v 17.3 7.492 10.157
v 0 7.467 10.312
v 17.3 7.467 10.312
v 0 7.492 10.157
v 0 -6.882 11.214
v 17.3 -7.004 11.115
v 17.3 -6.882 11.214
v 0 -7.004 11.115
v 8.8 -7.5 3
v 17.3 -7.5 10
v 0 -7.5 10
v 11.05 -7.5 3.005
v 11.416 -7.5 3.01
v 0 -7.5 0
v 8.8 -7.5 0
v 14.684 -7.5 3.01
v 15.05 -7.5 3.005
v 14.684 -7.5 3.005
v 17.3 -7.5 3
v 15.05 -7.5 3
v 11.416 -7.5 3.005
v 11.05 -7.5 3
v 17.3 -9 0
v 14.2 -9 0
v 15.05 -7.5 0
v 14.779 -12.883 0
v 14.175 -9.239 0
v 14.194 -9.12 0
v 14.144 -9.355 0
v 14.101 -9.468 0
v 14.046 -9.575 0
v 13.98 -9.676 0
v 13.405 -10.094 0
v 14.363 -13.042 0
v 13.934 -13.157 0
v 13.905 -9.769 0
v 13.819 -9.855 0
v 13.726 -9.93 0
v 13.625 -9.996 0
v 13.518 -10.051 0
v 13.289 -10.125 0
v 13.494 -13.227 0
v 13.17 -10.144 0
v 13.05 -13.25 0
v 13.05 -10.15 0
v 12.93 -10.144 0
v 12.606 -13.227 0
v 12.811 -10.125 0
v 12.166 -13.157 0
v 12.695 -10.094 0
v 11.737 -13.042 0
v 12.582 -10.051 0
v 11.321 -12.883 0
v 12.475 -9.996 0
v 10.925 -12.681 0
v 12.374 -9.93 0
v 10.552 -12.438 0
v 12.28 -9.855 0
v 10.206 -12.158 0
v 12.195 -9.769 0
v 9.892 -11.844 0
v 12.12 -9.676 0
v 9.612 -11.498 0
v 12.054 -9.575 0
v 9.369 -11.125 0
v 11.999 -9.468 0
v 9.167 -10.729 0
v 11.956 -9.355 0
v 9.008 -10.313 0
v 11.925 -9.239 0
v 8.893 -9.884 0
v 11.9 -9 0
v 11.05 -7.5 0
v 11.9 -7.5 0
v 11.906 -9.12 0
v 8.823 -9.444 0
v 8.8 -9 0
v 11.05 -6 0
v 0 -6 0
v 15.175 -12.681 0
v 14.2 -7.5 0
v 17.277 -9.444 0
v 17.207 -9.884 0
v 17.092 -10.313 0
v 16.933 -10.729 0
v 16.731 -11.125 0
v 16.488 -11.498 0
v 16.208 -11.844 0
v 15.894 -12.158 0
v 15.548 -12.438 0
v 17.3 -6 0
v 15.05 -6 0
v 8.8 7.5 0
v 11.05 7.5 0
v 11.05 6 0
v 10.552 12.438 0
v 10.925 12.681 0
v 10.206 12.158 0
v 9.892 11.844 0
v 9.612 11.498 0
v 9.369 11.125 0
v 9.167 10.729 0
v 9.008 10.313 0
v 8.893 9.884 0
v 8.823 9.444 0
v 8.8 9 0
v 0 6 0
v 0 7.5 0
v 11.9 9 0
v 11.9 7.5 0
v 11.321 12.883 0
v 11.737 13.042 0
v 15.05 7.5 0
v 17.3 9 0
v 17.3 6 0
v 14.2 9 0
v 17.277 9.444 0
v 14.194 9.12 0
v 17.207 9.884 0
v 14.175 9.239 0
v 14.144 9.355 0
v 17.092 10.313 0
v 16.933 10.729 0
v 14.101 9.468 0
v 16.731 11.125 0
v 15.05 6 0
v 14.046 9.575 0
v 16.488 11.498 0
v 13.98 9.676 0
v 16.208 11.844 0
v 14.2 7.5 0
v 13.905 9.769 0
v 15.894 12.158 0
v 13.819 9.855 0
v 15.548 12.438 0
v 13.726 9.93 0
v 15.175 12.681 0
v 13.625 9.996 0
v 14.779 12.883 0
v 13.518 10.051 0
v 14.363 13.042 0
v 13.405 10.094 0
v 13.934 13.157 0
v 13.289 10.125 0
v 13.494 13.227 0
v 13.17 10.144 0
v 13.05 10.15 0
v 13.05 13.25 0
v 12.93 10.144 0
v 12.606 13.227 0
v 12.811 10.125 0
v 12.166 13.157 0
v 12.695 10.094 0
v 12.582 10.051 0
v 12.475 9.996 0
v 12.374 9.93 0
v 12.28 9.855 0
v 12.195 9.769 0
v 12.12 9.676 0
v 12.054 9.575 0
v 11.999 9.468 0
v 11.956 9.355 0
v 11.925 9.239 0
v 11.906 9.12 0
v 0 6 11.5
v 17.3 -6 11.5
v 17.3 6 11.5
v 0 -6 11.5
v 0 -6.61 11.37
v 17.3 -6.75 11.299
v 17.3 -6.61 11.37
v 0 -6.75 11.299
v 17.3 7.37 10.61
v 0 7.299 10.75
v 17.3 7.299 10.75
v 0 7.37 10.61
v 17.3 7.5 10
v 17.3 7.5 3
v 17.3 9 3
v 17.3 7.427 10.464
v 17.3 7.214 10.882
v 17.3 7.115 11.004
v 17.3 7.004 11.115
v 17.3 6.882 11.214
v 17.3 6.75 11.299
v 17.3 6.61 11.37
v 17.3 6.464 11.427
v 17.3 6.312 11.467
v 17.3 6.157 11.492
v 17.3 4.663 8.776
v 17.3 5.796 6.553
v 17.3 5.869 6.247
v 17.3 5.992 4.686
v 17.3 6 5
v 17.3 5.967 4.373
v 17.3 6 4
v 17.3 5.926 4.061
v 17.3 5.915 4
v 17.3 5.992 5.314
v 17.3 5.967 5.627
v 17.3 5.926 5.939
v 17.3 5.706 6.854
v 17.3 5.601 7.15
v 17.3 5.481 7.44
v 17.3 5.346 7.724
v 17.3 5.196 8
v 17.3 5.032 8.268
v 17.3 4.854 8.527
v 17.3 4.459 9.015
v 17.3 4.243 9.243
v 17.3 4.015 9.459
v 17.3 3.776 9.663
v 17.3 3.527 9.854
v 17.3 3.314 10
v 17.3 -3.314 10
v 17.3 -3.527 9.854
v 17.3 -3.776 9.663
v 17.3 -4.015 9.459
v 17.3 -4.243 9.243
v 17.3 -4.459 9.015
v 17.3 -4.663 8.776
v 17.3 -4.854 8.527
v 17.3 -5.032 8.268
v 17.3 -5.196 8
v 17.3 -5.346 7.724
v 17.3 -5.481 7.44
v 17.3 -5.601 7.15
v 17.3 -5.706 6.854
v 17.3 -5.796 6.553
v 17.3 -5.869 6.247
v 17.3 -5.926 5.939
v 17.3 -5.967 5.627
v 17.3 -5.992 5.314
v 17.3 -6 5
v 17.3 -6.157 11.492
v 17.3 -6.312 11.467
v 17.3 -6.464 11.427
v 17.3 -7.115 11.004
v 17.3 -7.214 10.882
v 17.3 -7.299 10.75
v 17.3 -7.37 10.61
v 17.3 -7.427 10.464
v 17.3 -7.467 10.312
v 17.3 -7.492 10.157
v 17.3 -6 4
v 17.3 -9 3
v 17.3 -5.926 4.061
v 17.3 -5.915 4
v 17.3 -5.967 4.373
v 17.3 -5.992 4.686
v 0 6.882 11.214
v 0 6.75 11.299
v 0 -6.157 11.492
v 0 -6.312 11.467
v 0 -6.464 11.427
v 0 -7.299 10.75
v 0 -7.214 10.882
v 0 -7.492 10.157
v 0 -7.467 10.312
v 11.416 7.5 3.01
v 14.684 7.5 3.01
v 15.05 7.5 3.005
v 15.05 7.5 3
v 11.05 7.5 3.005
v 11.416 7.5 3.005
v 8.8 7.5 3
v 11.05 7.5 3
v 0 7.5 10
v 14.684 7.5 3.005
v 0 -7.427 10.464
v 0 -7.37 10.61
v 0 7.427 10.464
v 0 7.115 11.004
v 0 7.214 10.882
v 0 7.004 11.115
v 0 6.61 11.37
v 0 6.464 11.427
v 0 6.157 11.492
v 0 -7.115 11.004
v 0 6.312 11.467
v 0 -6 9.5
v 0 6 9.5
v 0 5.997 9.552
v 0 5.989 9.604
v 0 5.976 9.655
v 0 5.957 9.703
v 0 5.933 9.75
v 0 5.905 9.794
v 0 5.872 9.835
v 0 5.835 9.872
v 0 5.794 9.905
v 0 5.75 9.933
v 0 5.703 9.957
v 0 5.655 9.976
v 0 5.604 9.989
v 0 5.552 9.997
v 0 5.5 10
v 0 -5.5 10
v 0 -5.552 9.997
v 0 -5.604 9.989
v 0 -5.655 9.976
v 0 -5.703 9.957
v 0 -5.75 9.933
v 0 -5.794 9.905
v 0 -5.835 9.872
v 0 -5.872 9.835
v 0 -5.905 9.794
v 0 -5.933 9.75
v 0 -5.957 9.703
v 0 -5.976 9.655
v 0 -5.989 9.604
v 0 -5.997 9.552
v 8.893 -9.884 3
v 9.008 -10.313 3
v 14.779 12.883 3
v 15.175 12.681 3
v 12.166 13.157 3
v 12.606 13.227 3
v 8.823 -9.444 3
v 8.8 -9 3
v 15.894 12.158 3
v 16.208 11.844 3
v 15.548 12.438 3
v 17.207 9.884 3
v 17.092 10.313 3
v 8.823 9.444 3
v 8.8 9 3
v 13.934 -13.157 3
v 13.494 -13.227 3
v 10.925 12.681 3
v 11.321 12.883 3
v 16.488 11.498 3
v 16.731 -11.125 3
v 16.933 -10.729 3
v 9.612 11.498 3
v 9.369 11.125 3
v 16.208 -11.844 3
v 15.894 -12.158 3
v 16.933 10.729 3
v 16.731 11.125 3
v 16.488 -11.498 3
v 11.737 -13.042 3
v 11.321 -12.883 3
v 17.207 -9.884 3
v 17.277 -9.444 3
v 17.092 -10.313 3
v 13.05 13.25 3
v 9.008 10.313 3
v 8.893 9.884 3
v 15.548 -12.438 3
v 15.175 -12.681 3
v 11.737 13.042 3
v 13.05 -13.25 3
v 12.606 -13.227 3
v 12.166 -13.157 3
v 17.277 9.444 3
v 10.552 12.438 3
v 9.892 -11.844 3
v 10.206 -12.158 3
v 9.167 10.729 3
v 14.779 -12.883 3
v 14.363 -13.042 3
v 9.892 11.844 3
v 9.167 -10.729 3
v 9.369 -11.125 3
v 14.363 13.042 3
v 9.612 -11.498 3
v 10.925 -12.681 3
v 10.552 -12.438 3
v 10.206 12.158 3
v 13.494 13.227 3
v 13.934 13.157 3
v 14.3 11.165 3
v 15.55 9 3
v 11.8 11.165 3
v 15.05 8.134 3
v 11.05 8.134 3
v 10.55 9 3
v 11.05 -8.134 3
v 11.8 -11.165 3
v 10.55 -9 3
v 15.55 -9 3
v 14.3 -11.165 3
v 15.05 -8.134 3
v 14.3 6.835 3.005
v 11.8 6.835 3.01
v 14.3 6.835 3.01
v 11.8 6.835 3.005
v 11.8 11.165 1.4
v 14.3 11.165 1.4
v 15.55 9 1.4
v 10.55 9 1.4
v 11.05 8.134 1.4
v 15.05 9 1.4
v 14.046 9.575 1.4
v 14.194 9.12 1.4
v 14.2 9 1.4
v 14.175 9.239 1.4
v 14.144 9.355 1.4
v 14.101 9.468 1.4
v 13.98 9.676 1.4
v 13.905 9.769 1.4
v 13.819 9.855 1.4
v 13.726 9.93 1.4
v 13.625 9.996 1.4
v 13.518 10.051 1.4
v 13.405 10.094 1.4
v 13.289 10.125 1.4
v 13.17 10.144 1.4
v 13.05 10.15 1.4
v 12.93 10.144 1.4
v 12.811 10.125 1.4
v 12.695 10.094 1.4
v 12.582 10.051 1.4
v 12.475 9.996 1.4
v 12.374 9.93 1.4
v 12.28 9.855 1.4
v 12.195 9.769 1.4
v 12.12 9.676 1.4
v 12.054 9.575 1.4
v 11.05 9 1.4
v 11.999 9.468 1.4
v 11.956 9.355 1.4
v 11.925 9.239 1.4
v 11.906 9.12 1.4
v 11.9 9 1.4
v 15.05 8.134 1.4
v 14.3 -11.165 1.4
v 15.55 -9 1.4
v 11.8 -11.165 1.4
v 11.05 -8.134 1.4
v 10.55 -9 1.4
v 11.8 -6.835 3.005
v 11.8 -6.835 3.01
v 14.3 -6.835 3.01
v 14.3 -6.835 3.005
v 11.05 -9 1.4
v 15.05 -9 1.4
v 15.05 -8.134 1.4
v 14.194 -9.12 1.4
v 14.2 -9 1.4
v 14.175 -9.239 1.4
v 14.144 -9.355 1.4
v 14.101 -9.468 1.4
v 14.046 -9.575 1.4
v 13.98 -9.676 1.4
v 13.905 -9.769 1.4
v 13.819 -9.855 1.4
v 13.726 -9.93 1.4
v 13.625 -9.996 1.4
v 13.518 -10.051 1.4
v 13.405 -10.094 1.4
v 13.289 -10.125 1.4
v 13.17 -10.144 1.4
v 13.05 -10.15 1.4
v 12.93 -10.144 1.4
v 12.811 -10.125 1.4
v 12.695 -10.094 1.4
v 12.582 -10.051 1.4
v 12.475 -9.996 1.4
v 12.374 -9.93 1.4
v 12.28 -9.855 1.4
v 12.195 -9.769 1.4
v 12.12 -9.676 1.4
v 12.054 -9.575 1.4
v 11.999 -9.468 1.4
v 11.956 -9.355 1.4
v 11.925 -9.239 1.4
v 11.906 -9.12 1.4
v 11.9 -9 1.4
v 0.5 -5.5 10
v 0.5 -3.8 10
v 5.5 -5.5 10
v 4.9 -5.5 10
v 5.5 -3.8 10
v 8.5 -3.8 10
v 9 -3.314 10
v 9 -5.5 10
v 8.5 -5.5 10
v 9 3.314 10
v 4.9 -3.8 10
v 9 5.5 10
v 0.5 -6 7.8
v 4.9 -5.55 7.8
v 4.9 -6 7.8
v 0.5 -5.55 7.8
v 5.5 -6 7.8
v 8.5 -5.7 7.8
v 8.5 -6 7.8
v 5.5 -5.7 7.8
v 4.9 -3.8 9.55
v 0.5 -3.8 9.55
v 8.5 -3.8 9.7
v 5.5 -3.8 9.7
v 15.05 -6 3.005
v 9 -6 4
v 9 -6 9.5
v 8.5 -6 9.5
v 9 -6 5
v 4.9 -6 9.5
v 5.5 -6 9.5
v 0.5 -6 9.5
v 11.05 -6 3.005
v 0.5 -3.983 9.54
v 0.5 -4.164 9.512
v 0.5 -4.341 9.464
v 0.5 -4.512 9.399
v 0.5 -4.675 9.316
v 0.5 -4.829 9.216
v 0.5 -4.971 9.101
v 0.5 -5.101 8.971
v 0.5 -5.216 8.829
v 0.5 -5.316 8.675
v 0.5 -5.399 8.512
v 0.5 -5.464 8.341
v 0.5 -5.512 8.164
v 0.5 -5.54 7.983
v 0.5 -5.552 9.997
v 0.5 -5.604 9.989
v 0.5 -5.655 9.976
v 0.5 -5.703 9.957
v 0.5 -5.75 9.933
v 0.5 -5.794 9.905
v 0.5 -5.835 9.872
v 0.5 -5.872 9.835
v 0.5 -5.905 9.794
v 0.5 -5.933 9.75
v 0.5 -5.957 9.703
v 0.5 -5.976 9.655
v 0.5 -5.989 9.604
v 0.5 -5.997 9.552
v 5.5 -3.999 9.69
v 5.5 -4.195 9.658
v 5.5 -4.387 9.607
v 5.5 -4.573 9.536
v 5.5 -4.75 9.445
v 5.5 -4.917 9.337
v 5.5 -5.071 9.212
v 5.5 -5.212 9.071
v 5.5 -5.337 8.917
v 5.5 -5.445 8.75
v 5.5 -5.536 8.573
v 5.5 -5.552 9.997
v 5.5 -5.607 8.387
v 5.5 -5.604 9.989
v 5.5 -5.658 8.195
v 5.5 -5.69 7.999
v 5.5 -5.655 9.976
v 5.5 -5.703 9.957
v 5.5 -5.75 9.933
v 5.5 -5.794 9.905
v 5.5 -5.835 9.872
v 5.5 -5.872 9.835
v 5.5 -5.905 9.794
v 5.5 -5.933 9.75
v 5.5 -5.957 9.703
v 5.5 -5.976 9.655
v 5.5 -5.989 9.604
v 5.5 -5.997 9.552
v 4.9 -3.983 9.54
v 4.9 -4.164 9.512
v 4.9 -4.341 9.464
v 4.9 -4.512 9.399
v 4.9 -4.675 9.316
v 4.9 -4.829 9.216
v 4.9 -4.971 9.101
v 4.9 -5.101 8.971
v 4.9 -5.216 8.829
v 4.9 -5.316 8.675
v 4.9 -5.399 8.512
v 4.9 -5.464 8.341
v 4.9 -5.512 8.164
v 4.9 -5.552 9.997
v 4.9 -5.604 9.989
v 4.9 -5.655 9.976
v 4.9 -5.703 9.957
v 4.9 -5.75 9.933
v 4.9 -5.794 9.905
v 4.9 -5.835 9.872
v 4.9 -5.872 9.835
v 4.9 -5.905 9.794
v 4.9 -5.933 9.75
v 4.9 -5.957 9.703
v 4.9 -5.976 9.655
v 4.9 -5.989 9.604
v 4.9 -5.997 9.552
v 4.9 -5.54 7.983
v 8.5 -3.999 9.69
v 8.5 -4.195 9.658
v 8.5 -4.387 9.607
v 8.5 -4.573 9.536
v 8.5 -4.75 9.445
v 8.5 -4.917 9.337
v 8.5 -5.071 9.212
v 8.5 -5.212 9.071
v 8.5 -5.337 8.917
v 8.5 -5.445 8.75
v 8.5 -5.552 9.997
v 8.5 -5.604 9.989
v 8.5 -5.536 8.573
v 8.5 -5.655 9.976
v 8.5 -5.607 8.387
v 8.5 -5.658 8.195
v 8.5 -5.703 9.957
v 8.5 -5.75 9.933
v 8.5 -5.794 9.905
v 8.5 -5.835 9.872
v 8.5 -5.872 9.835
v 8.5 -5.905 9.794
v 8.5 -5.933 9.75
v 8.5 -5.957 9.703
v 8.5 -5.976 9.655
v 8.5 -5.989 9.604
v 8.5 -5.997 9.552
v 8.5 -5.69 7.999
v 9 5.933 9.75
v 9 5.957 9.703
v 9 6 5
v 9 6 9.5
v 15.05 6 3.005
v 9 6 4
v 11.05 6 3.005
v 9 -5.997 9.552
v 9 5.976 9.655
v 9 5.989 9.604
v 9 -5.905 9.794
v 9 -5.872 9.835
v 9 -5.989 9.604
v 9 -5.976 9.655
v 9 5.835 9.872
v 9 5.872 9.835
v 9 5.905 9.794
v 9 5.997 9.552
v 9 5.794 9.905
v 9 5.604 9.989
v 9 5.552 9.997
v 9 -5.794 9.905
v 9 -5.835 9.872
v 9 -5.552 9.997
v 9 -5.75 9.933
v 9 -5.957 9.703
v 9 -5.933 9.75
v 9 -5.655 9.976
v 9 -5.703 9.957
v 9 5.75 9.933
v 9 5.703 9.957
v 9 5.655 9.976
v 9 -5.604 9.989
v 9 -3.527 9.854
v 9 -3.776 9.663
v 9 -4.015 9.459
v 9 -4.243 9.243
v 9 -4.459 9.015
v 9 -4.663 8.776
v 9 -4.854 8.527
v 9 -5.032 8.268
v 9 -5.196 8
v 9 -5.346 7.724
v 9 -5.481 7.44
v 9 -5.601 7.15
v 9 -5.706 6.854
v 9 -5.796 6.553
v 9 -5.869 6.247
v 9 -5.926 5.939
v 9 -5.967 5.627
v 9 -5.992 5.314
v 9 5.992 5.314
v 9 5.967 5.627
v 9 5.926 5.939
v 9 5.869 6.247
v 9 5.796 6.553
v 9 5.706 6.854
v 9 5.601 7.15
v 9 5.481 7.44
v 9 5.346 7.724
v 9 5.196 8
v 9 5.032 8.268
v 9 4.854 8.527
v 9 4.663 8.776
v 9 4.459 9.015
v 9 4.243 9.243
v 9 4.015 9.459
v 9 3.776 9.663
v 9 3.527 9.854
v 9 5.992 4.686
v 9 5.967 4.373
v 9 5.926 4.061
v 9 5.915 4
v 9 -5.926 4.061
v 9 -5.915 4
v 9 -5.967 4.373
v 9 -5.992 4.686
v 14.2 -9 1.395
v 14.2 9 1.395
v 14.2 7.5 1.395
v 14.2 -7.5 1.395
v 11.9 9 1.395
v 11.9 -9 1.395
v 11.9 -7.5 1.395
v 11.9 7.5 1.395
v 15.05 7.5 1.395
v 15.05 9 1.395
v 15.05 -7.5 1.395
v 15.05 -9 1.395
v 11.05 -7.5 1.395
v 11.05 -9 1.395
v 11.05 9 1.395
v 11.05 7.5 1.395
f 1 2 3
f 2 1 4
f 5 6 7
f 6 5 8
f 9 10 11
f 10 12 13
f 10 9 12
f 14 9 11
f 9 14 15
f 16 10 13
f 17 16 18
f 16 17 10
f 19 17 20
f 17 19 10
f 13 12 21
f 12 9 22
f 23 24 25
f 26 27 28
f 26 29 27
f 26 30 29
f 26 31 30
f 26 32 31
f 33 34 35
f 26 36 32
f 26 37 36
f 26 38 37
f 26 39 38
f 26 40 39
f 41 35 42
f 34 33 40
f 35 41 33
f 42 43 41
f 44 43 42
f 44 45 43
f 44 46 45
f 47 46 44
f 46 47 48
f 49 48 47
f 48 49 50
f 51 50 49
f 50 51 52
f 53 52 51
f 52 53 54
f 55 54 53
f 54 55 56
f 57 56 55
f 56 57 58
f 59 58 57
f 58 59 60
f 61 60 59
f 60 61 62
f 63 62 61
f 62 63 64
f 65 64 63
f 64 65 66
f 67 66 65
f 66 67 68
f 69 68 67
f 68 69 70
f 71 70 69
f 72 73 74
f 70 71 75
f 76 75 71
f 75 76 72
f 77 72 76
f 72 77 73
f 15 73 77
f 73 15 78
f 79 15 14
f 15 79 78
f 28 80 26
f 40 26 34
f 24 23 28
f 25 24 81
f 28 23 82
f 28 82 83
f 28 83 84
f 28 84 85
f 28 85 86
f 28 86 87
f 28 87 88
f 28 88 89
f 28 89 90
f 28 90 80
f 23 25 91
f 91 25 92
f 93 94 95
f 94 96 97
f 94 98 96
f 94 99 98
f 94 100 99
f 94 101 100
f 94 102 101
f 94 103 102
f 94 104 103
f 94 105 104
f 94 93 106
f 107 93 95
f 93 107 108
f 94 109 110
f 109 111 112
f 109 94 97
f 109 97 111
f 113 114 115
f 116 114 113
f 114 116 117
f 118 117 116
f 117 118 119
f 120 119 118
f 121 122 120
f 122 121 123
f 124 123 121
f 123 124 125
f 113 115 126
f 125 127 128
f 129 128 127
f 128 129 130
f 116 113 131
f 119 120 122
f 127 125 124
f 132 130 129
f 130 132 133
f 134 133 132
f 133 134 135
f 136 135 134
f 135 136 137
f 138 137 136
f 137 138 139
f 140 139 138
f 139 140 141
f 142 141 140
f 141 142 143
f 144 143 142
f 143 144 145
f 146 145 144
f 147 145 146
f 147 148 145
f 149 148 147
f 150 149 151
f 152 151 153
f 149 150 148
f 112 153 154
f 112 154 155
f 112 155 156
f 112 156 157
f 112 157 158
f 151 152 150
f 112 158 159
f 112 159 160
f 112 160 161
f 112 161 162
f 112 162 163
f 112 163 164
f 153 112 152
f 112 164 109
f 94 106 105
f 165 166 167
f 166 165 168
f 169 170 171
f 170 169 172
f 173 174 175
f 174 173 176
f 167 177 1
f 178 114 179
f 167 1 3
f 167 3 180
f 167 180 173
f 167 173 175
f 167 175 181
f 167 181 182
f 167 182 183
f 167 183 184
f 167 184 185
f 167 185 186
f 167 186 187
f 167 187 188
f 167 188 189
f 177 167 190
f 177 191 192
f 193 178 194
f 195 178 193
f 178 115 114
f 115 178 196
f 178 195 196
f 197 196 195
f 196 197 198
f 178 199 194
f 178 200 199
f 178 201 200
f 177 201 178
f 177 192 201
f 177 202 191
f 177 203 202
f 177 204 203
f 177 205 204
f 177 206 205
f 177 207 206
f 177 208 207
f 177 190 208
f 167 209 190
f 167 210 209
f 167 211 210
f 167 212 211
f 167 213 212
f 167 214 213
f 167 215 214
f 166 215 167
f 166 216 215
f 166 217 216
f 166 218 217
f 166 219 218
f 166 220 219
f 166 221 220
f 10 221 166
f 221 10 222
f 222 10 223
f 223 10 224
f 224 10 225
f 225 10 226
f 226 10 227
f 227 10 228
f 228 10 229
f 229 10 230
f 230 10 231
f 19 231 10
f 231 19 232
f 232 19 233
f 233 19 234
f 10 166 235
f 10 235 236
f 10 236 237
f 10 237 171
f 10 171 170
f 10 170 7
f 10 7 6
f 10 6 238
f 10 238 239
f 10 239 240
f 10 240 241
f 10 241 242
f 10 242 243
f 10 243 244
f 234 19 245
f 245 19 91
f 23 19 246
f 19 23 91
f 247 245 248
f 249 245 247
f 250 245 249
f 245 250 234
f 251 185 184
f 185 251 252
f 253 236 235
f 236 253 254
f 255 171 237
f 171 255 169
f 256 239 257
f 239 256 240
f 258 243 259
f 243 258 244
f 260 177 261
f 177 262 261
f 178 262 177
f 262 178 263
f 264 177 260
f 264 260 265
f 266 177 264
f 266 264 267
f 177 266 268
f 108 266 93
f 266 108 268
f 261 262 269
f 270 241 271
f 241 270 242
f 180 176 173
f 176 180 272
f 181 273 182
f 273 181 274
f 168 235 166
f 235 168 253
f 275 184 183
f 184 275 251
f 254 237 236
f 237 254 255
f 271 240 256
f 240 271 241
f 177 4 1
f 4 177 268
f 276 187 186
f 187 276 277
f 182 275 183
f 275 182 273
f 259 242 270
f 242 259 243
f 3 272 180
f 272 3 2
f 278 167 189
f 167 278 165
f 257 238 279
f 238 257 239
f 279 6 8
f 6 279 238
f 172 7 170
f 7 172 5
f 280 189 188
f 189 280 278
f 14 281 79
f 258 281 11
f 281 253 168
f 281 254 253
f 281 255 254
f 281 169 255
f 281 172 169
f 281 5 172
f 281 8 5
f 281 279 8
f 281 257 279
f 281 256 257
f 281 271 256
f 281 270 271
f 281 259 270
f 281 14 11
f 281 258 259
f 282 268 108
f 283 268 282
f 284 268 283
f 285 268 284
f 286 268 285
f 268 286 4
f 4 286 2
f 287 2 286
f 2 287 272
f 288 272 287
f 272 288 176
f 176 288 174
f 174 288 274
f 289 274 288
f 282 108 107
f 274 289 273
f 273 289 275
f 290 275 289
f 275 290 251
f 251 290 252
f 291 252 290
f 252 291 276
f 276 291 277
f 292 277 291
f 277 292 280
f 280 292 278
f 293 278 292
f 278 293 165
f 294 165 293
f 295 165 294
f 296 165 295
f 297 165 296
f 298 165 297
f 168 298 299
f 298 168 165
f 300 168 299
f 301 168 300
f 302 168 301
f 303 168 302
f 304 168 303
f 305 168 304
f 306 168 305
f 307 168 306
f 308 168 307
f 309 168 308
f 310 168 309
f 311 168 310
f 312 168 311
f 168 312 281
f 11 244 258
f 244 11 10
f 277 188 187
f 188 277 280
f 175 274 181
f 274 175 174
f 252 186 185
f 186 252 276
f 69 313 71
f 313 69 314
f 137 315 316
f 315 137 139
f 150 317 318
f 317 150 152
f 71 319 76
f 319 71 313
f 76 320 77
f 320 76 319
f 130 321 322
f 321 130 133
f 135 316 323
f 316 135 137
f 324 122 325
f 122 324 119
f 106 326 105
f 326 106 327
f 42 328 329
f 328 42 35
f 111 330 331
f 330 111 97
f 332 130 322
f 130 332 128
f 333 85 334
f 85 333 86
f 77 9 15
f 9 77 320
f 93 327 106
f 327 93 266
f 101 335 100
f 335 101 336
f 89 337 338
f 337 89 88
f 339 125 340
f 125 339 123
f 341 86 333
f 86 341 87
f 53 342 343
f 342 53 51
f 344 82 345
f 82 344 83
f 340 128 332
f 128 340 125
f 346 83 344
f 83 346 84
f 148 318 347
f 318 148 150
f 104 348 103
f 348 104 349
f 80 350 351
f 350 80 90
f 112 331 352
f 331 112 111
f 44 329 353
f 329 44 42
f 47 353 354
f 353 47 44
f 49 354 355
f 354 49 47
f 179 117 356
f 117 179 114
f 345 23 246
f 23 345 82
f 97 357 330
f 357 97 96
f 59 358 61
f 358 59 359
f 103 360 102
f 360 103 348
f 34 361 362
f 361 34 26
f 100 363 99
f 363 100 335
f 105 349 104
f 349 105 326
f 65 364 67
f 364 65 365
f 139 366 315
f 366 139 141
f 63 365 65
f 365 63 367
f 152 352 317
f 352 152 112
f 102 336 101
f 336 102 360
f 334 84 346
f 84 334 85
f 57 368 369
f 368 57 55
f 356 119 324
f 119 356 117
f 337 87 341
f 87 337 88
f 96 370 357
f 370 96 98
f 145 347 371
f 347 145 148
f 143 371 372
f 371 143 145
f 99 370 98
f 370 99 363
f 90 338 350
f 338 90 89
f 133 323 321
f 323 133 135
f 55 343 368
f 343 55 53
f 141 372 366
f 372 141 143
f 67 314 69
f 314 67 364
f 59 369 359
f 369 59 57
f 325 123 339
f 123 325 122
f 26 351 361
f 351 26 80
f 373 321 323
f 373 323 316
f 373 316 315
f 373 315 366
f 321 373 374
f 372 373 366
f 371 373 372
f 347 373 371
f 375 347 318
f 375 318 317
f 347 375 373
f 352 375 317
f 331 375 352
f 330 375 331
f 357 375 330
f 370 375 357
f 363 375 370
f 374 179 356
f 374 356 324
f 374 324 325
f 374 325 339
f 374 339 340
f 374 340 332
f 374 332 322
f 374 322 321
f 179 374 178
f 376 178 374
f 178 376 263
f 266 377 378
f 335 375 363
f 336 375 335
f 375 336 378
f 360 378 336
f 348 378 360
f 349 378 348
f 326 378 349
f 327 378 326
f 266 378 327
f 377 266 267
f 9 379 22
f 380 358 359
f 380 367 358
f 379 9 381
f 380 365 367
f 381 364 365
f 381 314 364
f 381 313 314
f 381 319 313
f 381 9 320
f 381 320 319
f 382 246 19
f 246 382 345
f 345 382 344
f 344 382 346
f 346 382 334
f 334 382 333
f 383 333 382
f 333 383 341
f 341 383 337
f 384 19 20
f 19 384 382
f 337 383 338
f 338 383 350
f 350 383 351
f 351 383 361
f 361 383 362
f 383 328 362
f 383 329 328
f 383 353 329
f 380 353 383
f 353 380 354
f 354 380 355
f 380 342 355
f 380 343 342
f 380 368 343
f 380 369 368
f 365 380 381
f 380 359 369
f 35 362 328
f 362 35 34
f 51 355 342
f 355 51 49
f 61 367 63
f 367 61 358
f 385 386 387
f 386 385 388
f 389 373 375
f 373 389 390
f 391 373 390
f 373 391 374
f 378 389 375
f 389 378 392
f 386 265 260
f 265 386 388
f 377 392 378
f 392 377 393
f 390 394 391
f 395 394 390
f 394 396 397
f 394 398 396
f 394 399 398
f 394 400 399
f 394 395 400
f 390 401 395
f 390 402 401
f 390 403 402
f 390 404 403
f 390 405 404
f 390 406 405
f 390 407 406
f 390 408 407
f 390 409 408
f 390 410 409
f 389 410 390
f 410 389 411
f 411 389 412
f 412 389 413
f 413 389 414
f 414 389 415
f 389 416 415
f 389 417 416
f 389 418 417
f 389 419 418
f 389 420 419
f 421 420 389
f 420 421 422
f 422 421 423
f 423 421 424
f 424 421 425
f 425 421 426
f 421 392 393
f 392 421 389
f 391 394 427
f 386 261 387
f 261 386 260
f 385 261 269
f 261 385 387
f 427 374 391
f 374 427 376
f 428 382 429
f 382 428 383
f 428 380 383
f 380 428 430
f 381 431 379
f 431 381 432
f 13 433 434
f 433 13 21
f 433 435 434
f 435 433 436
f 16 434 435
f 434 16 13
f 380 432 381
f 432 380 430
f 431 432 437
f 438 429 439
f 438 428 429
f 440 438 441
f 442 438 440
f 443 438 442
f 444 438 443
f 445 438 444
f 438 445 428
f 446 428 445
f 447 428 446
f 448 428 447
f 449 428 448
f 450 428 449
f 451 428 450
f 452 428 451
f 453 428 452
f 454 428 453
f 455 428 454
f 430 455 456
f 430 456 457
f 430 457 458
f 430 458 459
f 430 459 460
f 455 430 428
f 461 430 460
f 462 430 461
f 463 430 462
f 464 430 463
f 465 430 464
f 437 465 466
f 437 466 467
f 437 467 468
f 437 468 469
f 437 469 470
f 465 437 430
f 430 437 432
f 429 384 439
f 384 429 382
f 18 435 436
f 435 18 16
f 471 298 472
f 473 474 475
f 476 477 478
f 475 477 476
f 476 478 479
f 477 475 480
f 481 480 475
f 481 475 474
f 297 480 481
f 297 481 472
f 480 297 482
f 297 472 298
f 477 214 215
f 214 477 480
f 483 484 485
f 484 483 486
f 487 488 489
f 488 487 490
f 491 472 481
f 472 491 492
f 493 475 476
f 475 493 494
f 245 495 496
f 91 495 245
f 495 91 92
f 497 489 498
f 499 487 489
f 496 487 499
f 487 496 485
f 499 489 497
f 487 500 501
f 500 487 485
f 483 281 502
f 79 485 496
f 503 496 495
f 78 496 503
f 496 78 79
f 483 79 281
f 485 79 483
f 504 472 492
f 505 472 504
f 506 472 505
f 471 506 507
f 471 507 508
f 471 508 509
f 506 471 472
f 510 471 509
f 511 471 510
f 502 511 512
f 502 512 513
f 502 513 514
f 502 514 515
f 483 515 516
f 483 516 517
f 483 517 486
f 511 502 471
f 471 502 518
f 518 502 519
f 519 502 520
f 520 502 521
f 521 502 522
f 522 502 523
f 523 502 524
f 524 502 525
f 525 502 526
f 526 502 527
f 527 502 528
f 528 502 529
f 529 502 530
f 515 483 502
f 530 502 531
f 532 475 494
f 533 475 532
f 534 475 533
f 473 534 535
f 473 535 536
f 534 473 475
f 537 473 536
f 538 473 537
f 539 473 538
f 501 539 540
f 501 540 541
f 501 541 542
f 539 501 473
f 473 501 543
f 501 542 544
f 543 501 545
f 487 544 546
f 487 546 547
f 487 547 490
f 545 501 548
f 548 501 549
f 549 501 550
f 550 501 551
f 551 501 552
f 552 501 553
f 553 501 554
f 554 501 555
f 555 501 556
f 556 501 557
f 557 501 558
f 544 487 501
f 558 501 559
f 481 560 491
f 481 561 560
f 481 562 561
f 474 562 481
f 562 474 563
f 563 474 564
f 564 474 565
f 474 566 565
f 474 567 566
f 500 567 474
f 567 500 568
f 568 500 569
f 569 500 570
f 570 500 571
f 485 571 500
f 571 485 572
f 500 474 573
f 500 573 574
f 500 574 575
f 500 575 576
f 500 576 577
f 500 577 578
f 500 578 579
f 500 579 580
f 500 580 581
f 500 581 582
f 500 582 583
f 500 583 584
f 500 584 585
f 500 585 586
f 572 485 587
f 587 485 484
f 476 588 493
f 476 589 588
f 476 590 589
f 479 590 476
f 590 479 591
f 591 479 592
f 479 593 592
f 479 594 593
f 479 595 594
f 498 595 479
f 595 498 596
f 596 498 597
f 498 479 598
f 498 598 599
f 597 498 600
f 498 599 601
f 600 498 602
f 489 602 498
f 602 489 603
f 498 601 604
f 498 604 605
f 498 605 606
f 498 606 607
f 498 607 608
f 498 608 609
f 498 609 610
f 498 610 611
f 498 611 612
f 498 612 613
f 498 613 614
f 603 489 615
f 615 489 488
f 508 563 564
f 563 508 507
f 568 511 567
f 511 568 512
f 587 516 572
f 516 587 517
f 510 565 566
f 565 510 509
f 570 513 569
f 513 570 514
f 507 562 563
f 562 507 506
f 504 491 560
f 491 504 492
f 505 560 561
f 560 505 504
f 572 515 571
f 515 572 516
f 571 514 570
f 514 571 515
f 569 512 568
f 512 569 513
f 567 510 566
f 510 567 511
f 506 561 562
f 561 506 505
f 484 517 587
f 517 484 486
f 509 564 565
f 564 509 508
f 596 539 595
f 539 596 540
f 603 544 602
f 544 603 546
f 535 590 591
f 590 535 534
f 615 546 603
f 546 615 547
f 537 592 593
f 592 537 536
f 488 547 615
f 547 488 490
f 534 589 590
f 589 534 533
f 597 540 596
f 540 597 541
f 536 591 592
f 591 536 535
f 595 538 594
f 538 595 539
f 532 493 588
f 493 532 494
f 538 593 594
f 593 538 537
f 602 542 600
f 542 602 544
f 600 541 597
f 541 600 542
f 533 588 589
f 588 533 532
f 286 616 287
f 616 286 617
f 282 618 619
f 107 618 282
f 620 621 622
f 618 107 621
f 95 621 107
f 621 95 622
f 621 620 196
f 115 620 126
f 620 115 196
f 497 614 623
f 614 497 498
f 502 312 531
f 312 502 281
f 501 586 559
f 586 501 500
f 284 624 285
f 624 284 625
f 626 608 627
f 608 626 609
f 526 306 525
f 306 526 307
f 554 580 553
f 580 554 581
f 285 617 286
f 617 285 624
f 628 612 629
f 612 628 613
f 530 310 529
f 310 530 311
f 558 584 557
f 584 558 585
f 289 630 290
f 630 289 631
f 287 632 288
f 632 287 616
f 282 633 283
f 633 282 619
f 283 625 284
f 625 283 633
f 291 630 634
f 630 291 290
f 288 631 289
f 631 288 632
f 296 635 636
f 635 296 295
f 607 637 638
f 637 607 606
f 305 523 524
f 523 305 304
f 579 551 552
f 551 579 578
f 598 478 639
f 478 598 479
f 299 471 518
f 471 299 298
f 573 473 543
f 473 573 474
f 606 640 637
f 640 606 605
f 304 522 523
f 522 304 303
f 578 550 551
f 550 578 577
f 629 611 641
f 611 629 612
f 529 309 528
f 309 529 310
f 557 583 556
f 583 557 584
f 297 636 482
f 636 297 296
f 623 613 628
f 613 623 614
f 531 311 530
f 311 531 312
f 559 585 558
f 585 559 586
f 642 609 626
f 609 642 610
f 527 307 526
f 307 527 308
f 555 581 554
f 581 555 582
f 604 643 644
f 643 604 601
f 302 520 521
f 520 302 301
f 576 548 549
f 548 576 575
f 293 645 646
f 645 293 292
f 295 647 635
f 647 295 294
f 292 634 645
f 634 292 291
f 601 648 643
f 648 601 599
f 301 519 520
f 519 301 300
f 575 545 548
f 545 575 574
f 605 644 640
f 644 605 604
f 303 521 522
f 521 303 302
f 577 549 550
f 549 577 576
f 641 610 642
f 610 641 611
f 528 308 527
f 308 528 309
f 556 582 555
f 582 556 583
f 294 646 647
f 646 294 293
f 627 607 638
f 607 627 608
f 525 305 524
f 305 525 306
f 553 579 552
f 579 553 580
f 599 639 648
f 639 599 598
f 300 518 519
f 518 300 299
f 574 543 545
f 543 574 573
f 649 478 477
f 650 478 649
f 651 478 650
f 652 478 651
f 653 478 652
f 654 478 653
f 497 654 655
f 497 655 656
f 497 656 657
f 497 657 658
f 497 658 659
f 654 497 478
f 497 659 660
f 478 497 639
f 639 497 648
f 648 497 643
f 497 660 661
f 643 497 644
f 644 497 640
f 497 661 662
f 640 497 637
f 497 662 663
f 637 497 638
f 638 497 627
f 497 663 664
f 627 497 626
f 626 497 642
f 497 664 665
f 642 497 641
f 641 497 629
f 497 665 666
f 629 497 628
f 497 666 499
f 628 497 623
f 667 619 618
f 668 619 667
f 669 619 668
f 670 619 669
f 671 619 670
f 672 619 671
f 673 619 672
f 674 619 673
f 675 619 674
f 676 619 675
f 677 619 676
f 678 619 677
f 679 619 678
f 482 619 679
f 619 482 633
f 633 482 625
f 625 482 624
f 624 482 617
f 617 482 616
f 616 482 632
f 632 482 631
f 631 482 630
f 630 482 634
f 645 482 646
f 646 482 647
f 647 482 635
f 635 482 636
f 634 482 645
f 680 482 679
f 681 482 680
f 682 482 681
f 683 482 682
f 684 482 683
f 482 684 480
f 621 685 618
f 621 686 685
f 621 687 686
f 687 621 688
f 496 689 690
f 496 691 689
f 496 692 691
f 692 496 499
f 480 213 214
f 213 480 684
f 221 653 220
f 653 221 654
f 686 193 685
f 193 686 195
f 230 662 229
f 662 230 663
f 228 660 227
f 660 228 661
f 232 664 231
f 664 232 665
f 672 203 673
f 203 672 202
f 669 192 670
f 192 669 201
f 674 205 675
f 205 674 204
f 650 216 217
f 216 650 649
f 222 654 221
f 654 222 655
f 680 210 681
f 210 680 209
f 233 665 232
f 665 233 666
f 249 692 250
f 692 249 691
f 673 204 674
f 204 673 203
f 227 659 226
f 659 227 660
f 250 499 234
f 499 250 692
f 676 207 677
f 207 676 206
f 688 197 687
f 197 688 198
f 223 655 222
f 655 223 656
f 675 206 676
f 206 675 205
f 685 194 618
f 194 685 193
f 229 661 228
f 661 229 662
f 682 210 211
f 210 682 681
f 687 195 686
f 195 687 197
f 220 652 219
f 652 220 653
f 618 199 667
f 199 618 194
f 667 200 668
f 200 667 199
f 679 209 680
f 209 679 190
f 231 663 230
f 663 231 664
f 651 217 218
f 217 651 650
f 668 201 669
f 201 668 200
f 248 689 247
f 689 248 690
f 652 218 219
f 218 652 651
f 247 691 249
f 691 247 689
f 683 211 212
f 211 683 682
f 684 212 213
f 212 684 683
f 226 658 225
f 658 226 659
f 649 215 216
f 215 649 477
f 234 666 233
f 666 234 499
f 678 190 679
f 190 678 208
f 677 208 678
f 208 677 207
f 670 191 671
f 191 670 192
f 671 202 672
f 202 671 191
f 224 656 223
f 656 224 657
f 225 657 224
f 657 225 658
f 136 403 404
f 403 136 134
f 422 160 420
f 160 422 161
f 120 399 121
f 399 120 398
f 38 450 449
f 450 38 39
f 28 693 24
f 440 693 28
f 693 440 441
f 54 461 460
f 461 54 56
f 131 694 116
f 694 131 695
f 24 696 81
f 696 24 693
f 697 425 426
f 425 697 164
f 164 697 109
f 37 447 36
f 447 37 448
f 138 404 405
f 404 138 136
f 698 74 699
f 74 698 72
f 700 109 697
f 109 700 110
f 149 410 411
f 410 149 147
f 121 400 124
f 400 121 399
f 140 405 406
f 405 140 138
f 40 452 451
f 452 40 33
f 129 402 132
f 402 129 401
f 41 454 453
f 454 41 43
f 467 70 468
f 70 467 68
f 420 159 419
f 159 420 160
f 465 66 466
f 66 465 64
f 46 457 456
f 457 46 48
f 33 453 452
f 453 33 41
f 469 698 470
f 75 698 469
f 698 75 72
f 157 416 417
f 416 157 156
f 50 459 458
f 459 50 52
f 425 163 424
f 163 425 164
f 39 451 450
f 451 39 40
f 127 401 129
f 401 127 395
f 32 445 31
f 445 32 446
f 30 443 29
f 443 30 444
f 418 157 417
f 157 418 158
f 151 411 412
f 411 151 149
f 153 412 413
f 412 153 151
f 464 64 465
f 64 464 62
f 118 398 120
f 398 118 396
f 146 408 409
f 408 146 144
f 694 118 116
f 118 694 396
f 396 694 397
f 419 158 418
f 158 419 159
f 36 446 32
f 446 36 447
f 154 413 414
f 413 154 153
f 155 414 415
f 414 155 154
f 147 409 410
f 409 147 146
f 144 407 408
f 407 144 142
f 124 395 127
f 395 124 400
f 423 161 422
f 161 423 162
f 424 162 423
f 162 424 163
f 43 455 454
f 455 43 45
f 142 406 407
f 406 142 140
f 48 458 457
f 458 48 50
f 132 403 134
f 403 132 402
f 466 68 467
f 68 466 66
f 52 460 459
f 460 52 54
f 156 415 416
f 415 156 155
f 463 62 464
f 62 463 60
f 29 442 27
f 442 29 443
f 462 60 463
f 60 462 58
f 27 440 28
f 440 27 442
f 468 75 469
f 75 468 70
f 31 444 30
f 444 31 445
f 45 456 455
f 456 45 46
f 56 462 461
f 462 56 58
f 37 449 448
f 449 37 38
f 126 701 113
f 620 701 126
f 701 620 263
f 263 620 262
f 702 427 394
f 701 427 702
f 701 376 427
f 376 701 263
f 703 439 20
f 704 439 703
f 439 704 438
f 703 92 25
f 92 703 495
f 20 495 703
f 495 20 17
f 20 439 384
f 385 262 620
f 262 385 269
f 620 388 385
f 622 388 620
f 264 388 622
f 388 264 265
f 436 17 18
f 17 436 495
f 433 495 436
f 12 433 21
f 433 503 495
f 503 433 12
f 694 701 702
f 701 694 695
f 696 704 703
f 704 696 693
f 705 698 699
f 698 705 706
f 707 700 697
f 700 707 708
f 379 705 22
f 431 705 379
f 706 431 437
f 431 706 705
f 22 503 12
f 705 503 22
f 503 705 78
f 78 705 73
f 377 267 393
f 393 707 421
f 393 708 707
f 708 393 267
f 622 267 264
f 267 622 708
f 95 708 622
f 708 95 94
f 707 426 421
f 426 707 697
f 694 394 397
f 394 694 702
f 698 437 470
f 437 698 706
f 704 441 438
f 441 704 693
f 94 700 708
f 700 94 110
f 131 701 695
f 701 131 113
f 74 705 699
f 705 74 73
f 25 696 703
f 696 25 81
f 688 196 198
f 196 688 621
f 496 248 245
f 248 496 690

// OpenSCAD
fudge = 0.01;

gear_length = 9.0;
gear_width = 12.0;
gear_height = 10.0;
gear_roundness = 0.5;
gear_wt = 0.4+0.2;
gear_x1 = 0.0-0.1;
gear_x2 = 5.0-0.1;
gear_x3 = gear_length-gear_wt+0.1;

bracket_height = 11.5;
bracket_length = 17.3;
bracket_width = 15.0;
bracket_roundness = 1.5;

flange_distance = 18.0;
flange_diameter = 8.5;
flange_height = 3.0;

nut_diameter = 5.0;

hole_diameter = 2.3;
hole_height = 1.4;

bottom_opening_width = 4.0;
bottom_opening_length = 15.0;

module bracket()
{
    difference()
    {
        union()
        {
            hull()
            {
                translate([0,-bracket_width/2,0]) cube([bracket_length, bracket_width, fudge]);
                for (my = [0,1]) mirror([0,my,0])
                    translate([0,bracket_width/2-bracket_roundness,bracket_height-bracket_roundness])
                        rotate([0,90,0]) cylinder(r=bracket_roundness,h=bracket_length,$fn=60);
            }
            hull() for (my = [0,1]) mirror([0,my,0])
                translate([bracket_length-flange_diameter/2,flange_distance/2,0])
                    cylinder(d=flange_diameter,h=flange_height,$fn=60);
        }
        hull() for (my = [0,1]) mirror([0,my,0])
            translate([bracket_length-flange_diameter/2,flange_distance/2,-fudge])
                cylinder(d=hole_diameter,h=hole_height+2*fudge,$fn=60);
        for (my = [0,1]) mirror([0,my,0])
            translate([bracket_length-flange_diameter/2,flange_distance/2,hole_height])
                cylinder(d=nut_diameter,h=flange_height-hole_height+fudge,$fn=6);
        translate([bracket_length-flange_diameter/2,0,hole_height+(flange_height-hole_height)/2]) cube([bottom_opening_width,flange_distance,flange_height-hole_height+fudge],center=true);
        translate([bracket_length-flange_diameter/2,0,hole_height/2-fudge]) cube([bottom_opening_width,bottom_opening_length,flange_height-hole_height+2*fudge],center=true);
        
        // gearbox
        difference()
        {
            hull()
            {
                translate([-fudge,-gear_width/2,-fudge]) cube([gear_length+fudge, gear_width, fudge]);
                for (my = [0,1]) mirror([0,my,0])
                    translate([-fudge,gear_width/2-gear_roundness,gear_height-gear_roundness])
                        rotate([0,90,0]) cylinder(r=gear_roundness,h=gear_length+fudge,$fn=60);
            }
            difference()
            {
                translate([0,-gear_width/2,gear_height-2.2]) cube([gear_length,2.2,2.2]);
                translate([gear_x1,-gear_width/2-fudge,gear_height-4-fudge]) cube([gear_wt,4+2*fudge,4+2*fudge]);
                translate([gear_x2,-gear_width/2-fudge,gear_height-4-fudge]) cube([gear_wt,4+2*fudge,4+2*fudge]);
                translate([gear_x3,-gear_width/2-fudge,gear_height-4-fudge]) cube([gear_wt,4+2*fudge,4+2*fudge]);
                translate([gear_x1,-gear_width/2+2.2,gear_height-2.2]) rotate([0,90,0]) cylinder(d=3.0+0.5,h=gear_x2-gear_x1+gear_wt,$fn=60);
                translate([gear_x2,-gear_width/2+2.2,gear_height-2.2]) rotate([0,90,0]) cylinder(d=3.3+0.5,h=gear_x3-gear_x2+gear_wt,$fn=60);
            }
        }
        // lower rectangular free cut
        translate([-fudge,-gear_width/2,-fudge]) cube([bracket_length+2*fudge, gear_width, 4+fudge]);   
        // motor
        translate([gear_length-fudge,0,5]) intersection()
        {
            rotate([0,90,0]) cylinder(d=12.0,h=bracket_length+2*fudge,$fn=120);
            translate([0,-12/2,-10/2]) cube([bracket_length+2*fudge, 12, 10]);
        }
    }
}

bracket();
